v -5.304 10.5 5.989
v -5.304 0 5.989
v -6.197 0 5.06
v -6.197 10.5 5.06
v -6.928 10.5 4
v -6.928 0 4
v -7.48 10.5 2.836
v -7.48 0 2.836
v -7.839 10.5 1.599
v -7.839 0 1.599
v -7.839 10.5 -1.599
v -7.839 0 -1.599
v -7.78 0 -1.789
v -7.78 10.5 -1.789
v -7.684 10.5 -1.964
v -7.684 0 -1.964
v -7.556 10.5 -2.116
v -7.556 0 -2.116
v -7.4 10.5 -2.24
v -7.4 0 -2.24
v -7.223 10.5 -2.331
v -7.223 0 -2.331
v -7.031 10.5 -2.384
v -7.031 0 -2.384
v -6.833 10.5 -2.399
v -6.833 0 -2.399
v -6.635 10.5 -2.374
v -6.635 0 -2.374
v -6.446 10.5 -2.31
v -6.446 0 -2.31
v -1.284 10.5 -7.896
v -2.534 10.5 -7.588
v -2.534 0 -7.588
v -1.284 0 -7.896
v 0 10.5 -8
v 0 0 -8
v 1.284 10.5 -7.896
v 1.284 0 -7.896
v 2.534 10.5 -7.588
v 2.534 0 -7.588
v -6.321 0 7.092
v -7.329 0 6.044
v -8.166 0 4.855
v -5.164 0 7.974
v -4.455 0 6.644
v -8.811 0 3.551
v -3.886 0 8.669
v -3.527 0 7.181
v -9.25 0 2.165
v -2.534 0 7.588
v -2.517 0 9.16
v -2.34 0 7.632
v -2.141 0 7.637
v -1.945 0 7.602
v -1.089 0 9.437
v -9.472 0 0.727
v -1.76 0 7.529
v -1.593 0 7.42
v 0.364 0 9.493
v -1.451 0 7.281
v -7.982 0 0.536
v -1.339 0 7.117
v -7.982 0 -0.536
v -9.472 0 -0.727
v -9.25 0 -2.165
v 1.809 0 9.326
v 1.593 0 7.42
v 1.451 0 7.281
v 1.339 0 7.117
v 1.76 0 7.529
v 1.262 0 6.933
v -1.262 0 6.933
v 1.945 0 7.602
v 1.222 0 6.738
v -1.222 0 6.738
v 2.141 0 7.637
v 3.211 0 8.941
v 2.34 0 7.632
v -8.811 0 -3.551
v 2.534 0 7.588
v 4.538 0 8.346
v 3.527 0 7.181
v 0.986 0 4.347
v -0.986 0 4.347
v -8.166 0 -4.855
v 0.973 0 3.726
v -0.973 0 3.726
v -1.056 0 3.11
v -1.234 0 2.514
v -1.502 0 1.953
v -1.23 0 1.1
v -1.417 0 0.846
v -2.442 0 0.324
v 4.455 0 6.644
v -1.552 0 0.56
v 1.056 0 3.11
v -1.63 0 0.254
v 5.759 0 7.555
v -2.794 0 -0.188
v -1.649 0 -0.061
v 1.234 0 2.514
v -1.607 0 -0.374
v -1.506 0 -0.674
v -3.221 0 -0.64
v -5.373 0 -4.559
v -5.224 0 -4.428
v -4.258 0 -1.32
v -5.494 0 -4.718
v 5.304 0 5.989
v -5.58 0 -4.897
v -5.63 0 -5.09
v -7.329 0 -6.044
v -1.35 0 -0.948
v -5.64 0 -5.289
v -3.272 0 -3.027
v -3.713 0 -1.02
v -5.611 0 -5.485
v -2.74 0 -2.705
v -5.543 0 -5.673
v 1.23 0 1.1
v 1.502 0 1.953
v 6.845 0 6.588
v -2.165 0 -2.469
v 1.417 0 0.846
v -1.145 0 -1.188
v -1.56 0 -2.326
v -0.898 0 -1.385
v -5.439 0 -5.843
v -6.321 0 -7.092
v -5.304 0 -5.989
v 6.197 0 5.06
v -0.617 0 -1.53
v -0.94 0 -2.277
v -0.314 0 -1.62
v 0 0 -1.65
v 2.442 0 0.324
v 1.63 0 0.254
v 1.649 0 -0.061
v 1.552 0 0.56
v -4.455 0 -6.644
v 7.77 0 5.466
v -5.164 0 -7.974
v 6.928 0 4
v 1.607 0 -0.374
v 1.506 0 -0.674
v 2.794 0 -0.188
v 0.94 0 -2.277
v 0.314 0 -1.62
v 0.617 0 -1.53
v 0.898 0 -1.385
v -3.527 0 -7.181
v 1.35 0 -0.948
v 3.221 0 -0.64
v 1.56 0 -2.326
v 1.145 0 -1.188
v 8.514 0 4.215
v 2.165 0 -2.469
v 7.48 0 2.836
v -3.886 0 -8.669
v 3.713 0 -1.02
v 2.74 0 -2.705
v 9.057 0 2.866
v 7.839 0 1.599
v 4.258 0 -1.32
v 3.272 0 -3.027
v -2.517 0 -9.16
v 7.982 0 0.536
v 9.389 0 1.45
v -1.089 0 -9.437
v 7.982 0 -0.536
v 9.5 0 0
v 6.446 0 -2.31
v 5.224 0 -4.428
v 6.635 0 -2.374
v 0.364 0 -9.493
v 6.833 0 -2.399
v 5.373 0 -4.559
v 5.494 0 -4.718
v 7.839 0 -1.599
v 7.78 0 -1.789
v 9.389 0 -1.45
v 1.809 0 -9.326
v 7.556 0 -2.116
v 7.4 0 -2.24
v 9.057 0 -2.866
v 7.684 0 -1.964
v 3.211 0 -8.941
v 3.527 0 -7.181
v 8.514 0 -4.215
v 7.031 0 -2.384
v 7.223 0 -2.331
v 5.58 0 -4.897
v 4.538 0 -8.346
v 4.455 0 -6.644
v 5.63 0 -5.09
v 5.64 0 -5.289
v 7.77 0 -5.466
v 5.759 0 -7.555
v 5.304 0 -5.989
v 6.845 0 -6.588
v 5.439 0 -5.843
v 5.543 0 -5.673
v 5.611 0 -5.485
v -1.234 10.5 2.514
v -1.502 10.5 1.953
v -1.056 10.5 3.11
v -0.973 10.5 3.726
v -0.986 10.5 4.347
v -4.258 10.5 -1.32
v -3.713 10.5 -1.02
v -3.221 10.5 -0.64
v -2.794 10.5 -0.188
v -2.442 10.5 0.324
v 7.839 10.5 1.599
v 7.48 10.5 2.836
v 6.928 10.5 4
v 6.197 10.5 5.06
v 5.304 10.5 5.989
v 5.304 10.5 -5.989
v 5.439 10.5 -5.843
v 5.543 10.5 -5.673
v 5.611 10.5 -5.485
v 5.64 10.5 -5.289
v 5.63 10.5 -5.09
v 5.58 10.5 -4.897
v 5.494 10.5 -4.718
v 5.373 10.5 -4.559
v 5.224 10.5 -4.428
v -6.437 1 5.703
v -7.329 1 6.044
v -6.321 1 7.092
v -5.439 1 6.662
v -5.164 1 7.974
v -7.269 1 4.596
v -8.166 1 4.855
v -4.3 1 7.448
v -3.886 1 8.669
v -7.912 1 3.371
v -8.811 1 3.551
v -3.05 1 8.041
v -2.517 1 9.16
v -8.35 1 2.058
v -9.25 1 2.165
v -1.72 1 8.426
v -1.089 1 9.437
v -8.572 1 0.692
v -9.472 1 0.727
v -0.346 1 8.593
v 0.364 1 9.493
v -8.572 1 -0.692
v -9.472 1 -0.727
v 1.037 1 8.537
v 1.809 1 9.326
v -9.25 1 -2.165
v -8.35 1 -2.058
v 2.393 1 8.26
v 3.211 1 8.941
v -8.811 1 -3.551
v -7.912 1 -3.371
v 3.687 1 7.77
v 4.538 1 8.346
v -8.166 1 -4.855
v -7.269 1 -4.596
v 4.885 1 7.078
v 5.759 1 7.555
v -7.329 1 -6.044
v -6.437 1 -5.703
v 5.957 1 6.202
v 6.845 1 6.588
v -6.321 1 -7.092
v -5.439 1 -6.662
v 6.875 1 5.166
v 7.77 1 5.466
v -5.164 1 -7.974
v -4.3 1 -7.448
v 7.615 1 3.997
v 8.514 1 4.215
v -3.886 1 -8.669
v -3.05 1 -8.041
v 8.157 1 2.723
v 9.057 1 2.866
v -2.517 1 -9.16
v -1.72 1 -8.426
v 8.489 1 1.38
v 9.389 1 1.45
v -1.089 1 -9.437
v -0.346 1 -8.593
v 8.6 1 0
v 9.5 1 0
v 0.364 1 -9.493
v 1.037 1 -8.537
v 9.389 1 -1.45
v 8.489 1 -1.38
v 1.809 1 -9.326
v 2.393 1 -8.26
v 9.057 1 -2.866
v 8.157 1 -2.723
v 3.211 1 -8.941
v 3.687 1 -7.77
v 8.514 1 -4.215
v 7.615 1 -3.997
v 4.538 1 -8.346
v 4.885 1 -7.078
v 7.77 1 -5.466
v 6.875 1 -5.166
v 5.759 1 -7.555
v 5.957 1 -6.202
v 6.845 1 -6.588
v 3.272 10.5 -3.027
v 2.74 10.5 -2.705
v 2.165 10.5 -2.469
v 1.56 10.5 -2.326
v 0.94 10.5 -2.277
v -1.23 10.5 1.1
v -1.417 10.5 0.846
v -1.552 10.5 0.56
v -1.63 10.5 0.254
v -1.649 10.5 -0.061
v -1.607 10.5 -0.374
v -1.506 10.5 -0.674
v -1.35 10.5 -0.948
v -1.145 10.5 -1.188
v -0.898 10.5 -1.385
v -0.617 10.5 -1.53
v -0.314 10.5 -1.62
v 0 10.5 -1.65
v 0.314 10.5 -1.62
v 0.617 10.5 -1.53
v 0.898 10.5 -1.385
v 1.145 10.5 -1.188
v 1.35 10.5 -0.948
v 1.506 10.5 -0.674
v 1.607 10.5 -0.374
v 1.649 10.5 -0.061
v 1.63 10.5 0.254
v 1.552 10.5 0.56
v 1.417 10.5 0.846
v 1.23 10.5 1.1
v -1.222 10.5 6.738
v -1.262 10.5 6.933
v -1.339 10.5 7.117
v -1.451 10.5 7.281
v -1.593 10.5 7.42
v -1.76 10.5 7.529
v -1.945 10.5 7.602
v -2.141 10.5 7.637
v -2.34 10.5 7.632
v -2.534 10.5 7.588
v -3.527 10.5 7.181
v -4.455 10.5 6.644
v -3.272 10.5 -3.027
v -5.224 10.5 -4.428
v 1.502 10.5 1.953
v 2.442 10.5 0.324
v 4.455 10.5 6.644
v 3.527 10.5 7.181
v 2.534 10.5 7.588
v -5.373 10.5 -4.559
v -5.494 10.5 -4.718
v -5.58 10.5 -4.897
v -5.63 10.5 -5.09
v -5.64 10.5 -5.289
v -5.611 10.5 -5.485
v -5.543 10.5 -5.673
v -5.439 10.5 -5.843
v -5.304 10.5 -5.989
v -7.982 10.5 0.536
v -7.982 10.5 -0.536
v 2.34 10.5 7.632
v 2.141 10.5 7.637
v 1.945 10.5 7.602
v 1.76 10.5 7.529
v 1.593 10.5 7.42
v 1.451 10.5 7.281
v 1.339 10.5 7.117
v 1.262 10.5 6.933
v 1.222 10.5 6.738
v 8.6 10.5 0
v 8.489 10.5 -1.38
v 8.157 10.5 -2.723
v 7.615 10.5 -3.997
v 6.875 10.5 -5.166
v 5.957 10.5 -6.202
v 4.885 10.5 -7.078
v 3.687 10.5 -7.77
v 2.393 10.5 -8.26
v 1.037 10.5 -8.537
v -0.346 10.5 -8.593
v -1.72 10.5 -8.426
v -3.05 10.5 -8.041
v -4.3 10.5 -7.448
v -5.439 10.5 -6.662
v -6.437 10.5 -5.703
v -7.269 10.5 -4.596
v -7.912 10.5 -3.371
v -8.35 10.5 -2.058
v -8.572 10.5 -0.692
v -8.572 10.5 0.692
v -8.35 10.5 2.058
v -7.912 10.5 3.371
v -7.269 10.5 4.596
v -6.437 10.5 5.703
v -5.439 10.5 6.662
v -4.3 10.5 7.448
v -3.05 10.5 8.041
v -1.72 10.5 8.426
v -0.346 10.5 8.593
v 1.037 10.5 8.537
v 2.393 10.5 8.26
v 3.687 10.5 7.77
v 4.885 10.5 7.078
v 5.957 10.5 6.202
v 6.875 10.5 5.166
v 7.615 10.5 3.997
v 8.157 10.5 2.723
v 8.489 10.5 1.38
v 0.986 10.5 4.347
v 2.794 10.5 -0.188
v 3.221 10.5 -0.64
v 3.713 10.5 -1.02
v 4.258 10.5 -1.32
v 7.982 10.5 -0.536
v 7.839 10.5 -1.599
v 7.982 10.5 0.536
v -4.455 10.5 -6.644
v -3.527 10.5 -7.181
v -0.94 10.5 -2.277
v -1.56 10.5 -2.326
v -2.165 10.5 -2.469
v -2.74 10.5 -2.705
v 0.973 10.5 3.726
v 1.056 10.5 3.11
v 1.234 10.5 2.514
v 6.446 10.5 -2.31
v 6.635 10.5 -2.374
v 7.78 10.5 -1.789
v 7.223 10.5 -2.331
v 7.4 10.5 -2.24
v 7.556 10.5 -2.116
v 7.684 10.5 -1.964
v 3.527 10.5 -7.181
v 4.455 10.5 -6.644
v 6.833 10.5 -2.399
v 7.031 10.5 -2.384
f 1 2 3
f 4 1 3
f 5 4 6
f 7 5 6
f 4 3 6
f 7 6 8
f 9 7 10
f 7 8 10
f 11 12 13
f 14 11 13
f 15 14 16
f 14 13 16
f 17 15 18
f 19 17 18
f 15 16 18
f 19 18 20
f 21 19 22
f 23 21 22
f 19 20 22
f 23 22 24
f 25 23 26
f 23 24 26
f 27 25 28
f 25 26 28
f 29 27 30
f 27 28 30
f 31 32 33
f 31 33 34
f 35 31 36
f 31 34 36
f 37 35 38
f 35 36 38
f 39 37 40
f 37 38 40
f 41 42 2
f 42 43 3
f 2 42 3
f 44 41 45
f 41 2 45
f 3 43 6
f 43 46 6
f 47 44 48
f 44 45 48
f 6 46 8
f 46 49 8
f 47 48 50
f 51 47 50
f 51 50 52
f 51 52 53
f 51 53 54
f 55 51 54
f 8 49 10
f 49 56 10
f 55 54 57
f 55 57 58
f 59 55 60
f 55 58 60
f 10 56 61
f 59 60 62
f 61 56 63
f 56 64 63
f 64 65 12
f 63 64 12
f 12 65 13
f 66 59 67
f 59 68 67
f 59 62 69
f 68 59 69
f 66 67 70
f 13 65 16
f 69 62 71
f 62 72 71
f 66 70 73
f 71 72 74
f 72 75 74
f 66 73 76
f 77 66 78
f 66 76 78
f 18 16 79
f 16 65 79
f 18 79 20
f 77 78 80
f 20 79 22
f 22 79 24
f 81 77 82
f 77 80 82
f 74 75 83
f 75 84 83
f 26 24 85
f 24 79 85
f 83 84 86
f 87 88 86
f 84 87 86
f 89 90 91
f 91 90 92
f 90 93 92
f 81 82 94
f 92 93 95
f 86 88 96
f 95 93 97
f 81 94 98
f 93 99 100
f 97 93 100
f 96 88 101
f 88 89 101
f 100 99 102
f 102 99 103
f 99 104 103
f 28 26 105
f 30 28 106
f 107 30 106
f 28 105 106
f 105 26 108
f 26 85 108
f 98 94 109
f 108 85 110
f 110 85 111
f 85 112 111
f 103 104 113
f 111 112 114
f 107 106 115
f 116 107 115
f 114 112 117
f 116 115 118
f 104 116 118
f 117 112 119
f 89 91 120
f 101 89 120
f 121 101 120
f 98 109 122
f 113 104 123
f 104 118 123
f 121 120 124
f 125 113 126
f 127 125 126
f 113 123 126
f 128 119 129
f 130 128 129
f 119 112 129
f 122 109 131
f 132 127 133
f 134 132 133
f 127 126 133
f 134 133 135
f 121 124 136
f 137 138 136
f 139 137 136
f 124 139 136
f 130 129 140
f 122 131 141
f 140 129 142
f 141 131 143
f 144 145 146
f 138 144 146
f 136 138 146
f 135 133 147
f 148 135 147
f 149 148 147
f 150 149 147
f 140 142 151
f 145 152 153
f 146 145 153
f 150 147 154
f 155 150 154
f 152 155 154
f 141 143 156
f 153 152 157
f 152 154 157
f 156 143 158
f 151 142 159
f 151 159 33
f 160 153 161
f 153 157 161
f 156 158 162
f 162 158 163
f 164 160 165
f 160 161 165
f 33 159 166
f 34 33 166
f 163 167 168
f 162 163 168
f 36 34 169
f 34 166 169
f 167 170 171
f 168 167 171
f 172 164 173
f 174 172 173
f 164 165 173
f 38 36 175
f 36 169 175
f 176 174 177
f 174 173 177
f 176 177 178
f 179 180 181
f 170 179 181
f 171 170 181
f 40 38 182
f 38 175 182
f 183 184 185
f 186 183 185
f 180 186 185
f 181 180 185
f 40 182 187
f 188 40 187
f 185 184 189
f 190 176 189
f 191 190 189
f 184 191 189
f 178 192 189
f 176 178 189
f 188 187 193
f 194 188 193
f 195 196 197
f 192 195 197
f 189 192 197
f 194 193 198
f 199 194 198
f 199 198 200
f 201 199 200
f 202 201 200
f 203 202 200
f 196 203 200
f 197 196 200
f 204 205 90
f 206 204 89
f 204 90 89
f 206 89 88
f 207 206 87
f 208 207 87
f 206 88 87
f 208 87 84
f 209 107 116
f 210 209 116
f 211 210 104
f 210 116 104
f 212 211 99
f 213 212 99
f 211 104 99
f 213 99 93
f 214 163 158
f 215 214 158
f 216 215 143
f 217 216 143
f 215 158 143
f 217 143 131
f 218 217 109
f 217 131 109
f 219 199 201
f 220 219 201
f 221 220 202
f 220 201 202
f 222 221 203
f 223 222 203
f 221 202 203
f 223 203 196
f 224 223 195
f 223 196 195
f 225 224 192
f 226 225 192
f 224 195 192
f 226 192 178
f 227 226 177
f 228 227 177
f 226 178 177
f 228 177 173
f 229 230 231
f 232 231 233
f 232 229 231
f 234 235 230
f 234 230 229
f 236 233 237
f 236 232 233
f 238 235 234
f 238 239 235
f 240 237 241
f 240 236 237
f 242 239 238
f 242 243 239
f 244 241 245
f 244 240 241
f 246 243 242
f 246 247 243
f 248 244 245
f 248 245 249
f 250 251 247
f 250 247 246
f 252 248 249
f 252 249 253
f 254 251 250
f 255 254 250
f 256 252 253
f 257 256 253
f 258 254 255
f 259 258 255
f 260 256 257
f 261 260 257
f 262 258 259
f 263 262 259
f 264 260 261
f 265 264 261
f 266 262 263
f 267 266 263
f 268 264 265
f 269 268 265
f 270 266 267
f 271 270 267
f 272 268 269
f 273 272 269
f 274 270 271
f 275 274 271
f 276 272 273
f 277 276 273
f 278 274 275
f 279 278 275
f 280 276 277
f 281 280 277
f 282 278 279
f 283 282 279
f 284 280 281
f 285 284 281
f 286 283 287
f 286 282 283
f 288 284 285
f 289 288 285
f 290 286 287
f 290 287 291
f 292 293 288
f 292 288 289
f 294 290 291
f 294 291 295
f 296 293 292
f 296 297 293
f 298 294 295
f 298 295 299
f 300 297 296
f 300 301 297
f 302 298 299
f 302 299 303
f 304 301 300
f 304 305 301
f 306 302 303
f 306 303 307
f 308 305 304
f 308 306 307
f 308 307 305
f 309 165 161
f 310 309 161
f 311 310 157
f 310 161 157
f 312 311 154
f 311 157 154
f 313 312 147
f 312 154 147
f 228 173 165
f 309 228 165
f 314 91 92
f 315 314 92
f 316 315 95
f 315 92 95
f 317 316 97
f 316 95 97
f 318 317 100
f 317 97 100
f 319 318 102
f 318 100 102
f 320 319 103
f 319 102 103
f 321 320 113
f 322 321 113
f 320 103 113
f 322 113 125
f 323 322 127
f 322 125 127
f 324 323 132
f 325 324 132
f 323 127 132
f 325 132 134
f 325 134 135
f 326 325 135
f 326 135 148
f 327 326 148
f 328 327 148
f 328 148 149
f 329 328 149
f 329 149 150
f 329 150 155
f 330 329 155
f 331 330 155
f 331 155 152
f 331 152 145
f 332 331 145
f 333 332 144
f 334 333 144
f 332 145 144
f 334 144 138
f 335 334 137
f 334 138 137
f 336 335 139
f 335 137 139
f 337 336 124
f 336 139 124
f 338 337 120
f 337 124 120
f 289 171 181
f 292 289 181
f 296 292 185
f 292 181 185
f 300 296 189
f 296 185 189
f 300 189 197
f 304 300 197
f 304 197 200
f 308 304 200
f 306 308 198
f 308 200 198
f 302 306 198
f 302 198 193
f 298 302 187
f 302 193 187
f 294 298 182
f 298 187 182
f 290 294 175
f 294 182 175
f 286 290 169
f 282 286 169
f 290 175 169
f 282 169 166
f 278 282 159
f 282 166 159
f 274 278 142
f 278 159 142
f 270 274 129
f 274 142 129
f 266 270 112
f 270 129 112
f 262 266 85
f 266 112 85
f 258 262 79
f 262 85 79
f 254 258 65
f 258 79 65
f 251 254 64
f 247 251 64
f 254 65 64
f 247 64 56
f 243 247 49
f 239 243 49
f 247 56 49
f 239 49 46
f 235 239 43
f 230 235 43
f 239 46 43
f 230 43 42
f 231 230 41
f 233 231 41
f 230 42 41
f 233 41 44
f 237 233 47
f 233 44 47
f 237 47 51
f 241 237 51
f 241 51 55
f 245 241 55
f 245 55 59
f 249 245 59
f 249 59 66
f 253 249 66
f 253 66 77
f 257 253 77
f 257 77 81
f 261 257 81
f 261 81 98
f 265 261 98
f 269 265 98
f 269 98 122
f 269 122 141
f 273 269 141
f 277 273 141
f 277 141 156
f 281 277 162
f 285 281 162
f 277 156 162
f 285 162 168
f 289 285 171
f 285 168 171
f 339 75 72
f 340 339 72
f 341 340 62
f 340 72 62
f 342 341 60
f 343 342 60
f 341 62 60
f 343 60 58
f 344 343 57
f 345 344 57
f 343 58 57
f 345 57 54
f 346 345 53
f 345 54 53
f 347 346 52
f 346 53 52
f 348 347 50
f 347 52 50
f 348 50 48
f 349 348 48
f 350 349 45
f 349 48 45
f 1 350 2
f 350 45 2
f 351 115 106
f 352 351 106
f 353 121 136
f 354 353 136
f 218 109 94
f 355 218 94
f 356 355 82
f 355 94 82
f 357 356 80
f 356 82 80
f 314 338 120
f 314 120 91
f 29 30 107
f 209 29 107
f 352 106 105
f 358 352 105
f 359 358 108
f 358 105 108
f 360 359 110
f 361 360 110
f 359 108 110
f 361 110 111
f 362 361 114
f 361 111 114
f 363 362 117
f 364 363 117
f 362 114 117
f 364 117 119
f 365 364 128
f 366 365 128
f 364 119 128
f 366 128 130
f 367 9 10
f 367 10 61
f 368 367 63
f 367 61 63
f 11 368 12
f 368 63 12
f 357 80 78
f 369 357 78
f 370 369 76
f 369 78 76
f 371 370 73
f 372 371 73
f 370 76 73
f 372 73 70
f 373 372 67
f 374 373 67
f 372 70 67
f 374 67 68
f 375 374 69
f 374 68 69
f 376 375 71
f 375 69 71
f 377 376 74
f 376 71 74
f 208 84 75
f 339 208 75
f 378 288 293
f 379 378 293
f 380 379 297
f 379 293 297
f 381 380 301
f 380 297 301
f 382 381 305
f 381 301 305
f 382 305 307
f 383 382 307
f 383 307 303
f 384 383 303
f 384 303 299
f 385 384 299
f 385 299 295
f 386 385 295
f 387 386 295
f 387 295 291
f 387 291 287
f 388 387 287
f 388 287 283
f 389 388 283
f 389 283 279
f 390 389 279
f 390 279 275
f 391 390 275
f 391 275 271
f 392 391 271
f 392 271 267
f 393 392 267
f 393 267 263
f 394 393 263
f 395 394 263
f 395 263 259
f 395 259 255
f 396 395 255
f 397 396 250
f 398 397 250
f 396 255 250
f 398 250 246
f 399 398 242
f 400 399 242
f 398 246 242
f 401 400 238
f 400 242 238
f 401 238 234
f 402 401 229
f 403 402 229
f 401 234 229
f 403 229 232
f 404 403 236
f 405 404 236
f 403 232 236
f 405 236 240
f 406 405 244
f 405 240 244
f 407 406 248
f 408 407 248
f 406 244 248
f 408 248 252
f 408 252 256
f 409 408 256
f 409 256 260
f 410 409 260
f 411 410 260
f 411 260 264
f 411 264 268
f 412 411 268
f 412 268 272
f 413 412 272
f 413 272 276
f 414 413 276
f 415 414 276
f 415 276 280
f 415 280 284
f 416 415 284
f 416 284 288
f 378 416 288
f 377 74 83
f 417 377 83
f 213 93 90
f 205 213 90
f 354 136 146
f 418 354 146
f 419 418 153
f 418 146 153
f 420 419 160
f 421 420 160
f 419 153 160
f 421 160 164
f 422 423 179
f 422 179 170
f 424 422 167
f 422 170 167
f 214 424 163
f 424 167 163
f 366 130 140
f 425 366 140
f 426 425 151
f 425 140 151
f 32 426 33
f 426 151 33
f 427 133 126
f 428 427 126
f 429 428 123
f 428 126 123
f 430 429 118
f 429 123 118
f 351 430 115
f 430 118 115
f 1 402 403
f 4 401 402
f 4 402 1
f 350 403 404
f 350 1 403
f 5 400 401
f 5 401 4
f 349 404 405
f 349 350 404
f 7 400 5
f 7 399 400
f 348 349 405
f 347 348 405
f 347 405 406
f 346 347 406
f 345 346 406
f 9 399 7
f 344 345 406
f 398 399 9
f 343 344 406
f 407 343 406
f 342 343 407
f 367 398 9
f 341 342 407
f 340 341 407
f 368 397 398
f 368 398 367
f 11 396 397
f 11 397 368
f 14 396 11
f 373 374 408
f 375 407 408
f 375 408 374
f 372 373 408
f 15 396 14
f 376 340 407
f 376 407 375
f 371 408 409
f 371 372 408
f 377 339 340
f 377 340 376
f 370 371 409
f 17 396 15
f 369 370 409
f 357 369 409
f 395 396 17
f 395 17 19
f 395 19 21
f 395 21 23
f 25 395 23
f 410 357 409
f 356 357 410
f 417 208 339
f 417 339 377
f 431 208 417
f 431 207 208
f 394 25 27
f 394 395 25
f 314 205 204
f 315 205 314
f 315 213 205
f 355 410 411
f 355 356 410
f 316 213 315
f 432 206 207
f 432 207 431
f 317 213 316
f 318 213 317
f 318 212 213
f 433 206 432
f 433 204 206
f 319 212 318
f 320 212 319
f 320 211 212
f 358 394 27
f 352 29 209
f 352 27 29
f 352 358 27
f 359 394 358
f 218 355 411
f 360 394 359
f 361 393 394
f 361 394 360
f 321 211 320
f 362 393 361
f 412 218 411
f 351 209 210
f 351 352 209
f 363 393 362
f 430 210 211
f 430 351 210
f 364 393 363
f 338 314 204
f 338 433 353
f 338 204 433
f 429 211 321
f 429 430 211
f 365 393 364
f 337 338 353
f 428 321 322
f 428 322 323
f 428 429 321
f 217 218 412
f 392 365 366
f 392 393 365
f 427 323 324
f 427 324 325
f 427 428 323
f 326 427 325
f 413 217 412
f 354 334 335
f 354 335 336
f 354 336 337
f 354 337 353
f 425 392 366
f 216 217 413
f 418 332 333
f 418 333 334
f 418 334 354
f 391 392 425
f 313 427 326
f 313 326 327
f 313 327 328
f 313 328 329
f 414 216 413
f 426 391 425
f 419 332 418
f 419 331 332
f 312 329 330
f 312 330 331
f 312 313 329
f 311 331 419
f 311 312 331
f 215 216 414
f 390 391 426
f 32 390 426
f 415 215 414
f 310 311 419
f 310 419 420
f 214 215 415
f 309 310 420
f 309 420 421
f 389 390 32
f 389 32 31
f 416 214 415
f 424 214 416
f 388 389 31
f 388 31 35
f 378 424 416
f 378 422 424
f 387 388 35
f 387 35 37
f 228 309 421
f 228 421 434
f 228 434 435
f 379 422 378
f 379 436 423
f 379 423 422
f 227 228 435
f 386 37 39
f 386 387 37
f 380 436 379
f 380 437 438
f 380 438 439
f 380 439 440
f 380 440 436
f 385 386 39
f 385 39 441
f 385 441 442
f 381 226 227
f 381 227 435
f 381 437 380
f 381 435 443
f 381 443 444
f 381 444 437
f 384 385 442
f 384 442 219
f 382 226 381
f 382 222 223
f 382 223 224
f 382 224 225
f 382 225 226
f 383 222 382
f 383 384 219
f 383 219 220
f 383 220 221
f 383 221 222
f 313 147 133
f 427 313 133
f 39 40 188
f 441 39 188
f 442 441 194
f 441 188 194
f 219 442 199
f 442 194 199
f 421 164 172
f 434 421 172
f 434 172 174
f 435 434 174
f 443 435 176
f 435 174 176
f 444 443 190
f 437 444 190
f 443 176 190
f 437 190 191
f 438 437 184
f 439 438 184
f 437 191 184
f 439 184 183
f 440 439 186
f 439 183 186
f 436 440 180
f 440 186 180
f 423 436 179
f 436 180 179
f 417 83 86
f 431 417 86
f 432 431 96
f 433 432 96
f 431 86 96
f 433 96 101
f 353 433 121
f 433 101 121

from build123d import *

# Parameters (mm, degrees)
SKETCH_1_R      = 9.5
SKETCH_1_R_2    = 8.6
EXTRUDE_2_DEPTH = 1
SKETCH_1_4_R    = 8.6
EXTRUDE_4_DEPTH = 10.5


with BuildPart() as part:
    # 草图1 → 凸台-拉伸2 (new body)
    with BuildSketch(Plane(origin=(0, 0, 0), x_dir=(1, 0, 0), z_dir=(0, 1, 0))):
        Circle(SKETCH_1_R)
        Circle(SKETCH_1_R_2, mode=Mode.SUBTRACT)
    extrude(amount=EXTRUDE_2_DEPTH)

    # 草图1<4> → 凸台-拉伸4 (add)
    with BuildSketch(Plane(origin=(0, 0, 0), x_dir=(1, 0, 0), z_dir=(0, 1, 0))):
        Circle(SKETCH_1_4_R)
        with BuildLine():
            ThreePointArc((-4.257529302, 1.319914676), (-3.22106843, 0.640114314), (-2.442480608, -0.324344434))
            Line((-2.442480608, -0.324344434), (-1.502130823, -1.953078038))
            ThreePointArc((-1.502130823, -1.953078038), (-1.056178958, -3.109584244), (-0.98568501, -4.347085871))
            Line((-0.98568501, -4.347085871), (-1.222344473, -6.737988124))
            ThreePointArc((-1.222344473, -6.737988124), (-1.673731111, -7.478733269), (-2.534264377, -7.58798419))
            ThreePointArc((-2.534264377, -7.58798419), (-4, -6.92820323), (-5.304254883, -5.988729426))
            ThreePointArc((-5.304254883, -5.988729426), (-6.92820323, -4), (-7.838519261, -1.599254764))
            ThreePointArc((-7.838519261, -1.599254764), (-8, 0), (-7.838519261, 1.599254764))
            ThreePointArc((-7.838519261, 1.599254764), (-7.313638554, 2.289872973), (-6.446441123, 2.310412696))
            Line((-6.446441123, 2.310412696), (-4.257529302, 1.319914676))
        make_face(mode=Mode.SUBTRACT)
        with BuildLine():
            ThreePointArc((2.442480608, -0.324344434), (3.22106843, 0.640114314), (4.257529302, 1.319914676))
            Line((4.257529302, 1.319914676), (6.446441123, 2.310412696))
            ThreePointArc((6.446441123, 2.310412696), (7.313638554, 2.289872973), (7.838519261, 1.599254764))
            ThreePointArc((7.838519261, 1.599254764), (8, 0), (7.838519261, -1.599254764))
            ThreePointArc((7.838519261, -1.599254764), (6.92820323, -4), (5.304254883, -5.988729426))
            ThreePointArc((5.304254883, -5.988729426), (4, -6.92820323), (2.534264377, -7.58798419))
            ThreePointArc((2.534264377, -7.58798419), (1.673731111, -7.478733269), (1.222344473, -6.737988124))
            Line((1.222344473, -6.737988124), (0.98568501, -4.347085871))
            ThreePointArc((0.98568501, -4.347085871), (1.056178958, -3.109584244), (1.502130823, -1.953078038))
            Line((1.502130823, -1.953078038), (2.442480608, -0.324344434))
        make_face(mode=Mode.SUBTRACT)
        with BuildLine():
            Line((5.22409665, 4.427575428), (3.271844291, 3.027171194))
            ThreePointArc((3.271844291, 3.027171194), (2.164889472, 2.469469931), (0.940349784, 2.277422472))
            Line((0.940349784, 2.277422472), (-0.940349784, 2.277422472))
            ThreePointArc((-0.940349784, 2.277422472), (-2.164889472, 2.469469931), (-3.271844291, 3.027171194))
            Line((-3.271844291, 3.027171194), (-5.22409665, 4.427575428))
            ThreePointArc((-5.22409665, 4.427575428), (-5.639907443, 5.188860296), (-5.304254883, 5.988729426))
            ThreePointArc((-5.304254883, 5.988729426), (-4, 6.92820323), (-2.534264377, 7.58798419))
            ThreePointArc((-2.534264377, 7.58798419), (0, 8), (2.534264377, 7.58798419))
            ThreePointArc((2.534264377, 7.58798419), (4, 6.92820323), (5.304254883, 5.988729426))
            ThreePointArc((5.304254883, 5.988729426), (5.639907443, 5.188860296), (5.22409665, 4.427575428))
        make_face(mode=Mode.SUBTRACT)
        with BuildLine():
            Line((1.229837388, -1.1), (-1.229837388, -1.1))
            ThreePointArc((-1.229837388, -1.1), (0, 1.65), (1.229837388, -1.1))
        make_face(mode=Mode.SUBTRACT)
    extrude(amount=EXTRUDE_4_DEPTH)


solid = part.part
